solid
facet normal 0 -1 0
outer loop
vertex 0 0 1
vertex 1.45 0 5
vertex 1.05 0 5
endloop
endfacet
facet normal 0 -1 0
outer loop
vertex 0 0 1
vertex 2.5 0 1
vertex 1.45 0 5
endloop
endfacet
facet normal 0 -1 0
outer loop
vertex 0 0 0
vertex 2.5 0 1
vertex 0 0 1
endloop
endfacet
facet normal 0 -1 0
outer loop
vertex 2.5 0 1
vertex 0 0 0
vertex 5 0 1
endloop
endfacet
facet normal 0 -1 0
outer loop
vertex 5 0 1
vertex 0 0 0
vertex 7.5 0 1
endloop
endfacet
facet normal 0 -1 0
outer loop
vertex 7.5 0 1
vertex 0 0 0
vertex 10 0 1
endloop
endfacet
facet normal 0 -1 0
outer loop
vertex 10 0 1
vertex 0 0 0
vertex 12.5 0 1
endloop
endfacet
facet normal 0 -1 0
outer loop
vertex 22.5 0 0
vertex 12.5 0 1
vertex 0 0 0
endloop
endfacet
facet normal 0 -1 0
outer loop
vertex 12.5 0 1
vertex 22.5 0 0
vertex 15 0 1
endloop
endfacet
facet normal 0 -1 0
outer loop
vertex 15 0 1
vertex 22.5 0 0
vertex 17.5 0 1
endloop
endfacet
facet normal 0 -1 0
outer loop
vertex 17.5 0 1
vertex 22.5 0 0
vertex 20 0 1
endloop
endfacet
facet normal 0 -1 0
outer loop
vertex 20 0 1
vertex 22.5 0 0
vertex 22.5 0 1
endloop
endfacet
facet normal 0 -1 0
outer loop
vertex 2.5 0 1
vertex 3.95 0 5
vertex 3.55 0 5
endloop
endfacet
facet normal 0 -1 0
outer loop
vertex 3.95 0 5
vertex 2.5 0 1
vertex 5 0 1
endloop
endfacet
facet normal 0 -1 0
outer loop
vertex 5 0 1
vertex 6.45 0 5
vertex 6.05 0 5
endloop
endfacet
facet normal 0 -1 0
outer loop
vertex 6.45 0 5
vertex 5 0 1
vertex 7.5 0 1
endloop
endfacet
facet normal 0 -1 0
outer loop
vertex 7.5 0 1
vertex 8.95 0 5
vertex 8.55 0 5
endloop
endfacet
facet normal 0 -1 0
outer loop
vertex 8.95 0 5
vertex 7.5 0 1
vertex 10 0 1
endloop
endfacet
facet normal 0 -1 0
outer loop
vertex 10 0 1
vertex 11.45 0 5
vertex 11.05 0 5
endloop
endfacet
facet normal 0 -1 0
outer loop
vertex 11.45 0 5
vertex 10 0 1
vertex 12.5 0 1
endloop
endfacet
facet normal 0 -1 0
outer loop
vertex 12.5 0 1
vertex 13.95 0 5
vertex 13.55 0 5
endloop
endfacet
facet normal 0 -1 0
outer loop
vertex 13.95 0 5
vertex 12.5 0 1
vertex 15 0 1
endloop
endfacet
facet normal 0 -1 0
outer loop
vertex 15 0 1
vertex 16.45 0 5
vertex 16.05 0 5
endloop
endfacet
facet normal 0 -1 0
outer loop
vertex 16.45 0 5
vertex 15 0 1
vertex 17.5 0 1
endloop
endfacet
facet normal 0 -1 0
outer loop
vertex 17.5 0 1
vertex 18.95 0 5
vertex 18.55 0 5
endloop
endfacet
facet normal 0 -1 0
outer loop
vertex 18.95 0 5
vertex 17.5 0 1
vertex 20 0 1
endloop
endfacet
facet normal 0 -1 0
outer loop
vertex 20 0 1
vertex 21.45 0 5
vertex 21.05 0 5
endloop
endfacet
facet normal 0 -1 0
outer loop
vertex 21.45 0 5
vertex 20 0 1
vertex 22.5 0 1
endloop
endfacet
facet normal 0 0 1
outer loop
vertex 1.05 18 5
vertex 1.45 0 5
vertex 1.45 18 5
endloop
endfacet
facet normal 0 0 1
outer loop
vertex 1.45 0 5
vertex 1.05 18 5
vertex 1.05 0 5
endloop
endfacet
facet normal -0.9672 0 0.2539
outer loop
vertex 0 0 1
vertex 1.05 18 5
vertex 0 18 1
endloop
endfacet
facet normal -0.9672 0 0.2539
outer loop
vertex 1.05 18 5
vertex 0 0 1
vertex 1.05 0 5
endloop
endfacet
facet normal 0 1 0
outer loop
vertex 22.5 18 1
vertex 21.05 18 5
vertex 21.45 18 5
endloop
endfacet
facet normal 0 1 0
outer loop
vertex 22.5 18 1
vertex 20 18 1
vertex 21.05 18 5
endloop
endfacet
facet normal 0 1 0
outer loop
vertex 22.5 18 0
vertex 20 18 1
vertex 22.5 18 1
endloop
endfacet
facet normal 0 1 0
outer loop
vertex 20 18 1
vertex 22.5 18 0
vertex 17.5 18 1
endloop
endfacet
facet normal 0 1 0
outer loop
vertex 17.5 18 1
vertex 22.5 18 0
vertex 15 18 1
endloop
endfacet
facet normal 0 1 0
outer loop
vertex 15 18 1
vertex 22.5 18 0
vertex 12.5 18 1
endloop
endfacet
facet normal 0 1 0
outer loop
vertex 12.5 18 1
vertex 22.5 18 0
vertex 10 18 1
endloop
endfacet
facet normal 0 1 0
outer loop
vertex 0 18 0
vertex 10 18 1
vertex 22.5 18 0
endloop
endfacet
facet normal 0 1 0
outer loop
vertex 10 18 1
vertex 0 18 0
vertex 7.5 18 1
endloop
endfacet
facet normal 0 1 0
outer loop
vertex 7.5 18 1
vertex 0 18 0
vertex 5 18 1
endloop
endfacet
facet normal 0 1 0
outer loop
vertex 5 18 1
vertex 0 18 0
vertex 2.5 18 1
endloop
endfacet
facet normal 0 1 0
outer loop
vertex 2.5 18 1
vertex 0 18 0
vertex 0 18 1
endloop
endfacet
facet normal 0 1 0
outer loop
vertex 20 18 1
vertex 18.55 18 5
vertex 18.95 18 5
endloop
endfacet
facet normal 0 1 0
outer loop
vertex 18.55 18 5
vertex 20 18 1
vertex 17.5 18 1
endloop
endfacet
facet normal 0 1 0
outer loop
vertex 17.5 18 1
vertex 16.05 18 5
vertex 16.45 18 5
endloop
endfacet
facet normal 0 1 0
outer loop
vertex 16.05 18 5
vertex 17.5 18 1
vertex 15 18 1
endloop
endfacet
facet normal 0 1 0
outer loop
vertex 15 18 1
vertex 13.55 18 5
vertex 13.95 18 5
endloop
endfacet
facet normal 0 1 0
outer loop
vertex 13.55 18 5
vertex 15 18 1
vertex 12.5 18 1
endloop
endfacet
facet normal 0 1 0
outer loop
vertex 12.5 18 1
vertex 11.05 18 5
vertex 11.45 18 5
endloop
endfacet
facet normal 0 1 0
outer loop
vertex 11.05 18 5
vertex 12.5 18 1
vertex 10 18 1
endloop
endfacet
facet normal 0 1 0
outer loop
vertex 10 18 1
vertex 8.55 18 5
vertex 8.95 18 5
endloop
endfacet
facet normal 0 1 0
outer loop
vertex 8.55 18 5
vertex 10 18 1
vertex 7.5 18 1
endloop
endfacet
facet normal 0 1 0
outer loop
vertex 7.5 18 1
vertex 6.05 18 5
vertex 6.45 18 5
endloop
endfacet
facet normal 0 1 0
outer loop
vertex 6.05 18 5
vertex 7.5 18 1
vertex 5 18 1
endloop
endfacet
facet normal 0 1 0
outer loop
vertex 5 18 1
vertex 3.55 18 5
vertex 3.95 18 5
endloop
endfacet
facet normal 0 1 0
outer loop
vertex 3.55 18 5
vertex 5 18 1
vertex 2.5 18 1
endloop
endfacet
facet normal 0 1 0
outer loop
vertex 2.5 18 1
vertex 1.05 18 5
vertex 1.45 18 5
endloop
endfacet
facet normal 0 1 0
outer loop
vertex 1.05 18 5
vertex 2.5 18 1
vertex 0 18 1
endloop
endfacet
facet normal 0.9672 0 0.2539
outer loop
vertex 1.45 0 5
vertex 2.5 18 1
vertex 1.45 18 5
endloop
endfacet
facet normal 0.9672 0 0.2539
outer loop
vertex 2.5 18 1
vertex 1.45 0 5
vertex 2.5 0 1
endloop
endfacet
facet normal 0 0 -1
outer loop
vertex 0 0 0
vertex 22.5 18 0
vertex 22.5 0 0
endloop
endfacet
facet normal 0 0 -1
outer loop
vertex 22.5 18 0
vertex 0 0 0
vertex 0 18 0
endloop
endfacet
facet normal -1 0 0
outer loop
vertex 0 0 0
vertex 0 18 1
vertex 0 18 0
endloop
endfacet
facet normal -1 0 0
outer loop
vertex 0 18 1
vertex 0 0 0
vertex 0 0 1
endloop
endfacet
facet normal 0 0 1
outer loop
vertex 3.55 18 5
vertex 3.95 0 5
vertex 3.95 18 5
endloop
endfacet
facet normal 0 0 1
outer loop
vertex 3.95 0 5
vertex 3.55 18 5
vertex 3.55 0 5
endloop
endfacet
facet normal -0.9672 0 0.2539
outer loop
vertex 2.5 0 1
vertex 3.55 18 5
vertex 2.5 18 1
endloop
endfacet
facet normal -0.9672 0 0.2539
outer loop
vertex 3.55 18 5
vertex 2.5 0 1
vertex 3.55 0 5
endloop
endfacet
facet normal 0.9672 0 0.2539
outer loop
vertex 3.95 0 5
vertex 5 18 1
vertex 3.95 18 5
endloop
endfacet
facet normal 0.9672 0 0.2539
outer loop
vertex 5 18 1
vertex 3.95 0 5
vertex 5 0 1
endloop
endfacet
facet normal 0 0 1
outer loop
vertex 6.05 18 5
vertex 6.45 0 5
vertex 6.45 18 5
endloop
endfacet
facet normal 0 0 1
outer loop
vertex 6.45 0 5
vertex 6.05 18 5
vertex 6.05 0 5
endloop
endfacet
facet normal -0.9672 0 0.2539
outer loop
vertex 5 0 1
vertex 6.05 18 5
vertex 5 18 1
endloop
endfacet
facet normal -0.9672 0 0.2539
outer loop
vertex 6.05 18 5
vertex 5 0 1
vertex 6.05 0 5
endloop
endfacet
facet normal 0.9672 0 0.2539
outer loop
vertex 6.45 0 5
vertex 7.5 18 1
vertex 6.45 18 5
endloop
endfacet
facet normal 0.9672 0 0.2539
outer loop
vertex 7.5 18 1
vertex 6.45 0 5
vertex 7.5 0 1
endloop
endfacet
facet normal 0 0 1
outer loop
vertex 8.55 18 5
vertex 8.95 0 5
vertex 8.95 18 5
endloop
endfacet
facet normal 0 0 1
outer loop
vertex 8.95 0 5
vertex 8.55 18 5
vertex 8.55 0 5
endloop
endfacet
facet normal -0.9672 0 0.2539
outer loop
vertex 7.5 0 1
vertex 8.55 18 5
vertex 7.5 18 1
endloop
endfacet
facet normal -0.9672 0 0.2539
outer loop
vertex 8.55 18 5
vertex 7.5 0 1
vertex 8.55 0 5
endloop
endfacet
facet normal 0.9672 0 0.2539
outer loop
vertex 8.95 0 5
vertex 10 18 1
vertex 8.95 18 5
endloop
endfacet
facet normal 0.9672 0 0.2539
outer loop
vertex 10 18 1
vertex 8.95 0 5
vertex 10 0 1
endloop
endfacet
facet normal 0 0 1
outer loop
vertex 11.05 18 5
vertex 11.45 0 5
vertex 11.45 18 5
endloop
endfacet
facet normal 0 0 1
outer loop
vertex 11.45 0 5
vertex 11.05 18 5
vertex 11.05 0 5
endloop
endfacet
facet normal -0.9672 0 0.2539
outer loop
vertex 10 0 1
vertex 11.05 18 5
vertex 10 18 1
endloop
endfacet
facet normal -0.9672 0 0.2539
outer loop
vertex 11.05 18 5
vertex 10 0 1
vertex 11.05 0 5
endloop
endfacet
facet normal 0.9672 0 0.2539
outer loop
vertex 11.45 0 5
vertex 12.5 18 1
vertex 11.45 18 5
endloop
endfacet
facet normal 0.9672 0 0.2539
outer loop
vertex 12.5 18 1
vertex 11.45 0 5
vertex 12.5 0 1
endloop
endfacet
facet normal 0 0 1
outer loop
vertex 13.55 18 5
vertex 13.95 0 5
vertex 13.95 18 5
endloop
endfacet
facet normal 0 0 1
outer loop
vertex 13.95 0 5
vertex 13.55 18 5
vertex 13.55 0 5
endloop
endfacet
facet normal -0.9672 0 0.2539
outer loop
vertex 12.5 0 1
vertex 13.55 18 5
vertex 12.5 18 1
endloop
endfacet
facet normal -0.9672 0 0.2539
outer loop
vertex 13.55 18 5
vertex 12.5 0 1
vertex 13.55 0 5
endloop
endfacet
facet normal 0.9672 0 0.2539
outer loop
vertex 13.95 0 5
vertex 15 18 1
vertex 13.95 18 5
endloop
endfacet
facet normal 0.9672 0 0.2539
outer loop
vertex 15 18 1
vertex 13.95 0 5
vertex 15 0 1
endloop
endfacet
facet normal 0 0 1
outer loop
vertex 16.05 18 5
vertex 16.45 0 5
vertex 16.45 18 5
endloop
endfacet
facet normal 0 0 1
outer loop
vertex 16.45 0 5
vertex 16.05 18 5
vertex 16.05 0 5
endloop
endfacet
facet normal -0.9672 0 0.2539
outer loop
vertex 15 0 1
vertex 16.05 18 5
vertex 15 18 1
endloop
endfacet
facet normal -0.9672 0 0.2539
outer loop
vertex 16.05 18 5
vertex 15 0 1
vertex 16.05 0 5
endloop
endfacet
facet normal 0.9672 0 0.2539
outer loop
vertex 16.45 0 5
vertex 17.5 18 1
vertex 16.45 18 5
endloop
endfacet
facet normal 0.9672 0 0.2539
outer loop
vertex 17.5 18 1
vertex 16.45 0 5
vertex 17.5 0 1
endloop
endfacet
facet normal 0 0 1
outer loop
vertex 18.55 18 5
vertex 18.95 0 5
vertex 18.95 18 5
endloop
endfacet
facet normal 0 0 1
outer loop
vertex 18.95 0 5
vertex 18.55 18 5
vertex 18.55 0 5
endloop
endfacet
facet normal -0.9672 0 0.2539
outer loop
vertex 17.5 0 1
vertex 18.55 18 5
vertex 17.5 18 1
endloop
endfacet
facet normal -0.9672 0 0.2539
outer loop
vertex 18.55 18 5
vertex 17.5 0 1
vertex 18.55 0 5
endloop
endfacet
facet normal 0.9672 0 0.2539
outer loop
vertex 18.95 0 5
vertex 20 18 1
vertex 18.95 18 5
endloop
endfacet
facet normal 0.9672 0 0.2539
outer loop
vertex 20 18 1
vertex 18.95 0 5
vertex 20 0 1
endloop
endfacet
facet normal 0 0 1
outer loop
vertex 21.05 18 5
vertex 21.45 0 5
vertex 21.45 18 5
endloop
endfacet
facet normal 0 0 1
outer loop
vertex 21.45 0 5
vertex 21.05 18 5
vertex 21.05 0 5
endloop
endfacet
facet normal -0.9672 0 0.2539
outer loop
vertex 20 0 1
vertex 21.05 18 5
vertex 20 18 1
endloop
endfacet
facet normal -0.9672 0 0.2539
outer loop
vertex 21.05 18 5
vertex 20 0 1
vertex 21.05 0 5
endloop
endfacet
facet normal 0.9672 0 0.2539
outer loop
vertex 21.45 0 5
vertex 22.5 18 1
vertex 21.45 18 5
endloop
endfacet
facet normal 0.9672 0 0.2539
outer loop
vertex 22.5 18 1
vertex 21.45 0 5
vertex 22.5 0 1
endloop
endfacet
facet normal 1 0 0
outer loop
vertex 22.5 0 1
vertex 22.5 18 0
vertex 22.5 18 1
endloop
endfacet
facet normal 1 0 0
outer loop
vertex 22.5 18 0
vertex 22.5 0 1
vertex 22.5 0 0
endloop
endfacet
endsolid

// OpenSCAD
/* [ Global ] */

// Width will be rounded down to fit the space the triangles on the surface take.  (in mm)
width = 24; //  [10:1:200]
// Height  (or length, not thickness)  (in mm)
height = 18;//  [10:1:200]
// Thickness of pad base (in mm)
bottom_thickness = 1; //[0.1:0.1:5]

/* [ Advanced ] */

// Width of flat top surface, intended to be extrusion width of the nozzle, but you can set it to large values if you want a bigger cut-off flat top. (in mm)
extrude_width = 0.4;//  [0.1:0.1:20]
// Height of individual triangle (in mm)
tri_height = 4;//  [1:1:20]
// width of triangle base, extrude width will be added to this (in mm)
tri_width = 2.1;//  [1:1:20]

/* [ Hidden ] */

tri_w = tri_width + extrude_width;

x = floor(width /tri_w) * tri_w;
y = height;
z = bottom_thickness;



tri_points = [
    [0,0,0],
    [tri_w,0,0],
    [(tri_w - extrude_width)/ 2 ,0, tri_height],
    [((tri_w - extrude_width)/ 2) +extrude_width,0 ,tri_height],
    [0,y,0],
    [tri_w,y,0],
    [(tri_w - extrude_width)/ 2 ,y, tri_height],
    [((tri_w - extrude_width)/ 2) +extrude_width,y ,tri_height]
];
tri_faces = [
    [0,2,3,1],
    [0,4,6,2],
    [4,5,7,6],
    [2,6,7,3],
    [3,7,5,1],
    [0,1,5,4]
];
echo(x, "x", y);
union(){
    for (a = [0:tri_w:x - tri_w]){
        union(){
            translate([a,0,z])polyhedron( tri_points, tri_faces );
            translate([a,0,0])cube([tri_w, y, z]);
        };
    };
}
